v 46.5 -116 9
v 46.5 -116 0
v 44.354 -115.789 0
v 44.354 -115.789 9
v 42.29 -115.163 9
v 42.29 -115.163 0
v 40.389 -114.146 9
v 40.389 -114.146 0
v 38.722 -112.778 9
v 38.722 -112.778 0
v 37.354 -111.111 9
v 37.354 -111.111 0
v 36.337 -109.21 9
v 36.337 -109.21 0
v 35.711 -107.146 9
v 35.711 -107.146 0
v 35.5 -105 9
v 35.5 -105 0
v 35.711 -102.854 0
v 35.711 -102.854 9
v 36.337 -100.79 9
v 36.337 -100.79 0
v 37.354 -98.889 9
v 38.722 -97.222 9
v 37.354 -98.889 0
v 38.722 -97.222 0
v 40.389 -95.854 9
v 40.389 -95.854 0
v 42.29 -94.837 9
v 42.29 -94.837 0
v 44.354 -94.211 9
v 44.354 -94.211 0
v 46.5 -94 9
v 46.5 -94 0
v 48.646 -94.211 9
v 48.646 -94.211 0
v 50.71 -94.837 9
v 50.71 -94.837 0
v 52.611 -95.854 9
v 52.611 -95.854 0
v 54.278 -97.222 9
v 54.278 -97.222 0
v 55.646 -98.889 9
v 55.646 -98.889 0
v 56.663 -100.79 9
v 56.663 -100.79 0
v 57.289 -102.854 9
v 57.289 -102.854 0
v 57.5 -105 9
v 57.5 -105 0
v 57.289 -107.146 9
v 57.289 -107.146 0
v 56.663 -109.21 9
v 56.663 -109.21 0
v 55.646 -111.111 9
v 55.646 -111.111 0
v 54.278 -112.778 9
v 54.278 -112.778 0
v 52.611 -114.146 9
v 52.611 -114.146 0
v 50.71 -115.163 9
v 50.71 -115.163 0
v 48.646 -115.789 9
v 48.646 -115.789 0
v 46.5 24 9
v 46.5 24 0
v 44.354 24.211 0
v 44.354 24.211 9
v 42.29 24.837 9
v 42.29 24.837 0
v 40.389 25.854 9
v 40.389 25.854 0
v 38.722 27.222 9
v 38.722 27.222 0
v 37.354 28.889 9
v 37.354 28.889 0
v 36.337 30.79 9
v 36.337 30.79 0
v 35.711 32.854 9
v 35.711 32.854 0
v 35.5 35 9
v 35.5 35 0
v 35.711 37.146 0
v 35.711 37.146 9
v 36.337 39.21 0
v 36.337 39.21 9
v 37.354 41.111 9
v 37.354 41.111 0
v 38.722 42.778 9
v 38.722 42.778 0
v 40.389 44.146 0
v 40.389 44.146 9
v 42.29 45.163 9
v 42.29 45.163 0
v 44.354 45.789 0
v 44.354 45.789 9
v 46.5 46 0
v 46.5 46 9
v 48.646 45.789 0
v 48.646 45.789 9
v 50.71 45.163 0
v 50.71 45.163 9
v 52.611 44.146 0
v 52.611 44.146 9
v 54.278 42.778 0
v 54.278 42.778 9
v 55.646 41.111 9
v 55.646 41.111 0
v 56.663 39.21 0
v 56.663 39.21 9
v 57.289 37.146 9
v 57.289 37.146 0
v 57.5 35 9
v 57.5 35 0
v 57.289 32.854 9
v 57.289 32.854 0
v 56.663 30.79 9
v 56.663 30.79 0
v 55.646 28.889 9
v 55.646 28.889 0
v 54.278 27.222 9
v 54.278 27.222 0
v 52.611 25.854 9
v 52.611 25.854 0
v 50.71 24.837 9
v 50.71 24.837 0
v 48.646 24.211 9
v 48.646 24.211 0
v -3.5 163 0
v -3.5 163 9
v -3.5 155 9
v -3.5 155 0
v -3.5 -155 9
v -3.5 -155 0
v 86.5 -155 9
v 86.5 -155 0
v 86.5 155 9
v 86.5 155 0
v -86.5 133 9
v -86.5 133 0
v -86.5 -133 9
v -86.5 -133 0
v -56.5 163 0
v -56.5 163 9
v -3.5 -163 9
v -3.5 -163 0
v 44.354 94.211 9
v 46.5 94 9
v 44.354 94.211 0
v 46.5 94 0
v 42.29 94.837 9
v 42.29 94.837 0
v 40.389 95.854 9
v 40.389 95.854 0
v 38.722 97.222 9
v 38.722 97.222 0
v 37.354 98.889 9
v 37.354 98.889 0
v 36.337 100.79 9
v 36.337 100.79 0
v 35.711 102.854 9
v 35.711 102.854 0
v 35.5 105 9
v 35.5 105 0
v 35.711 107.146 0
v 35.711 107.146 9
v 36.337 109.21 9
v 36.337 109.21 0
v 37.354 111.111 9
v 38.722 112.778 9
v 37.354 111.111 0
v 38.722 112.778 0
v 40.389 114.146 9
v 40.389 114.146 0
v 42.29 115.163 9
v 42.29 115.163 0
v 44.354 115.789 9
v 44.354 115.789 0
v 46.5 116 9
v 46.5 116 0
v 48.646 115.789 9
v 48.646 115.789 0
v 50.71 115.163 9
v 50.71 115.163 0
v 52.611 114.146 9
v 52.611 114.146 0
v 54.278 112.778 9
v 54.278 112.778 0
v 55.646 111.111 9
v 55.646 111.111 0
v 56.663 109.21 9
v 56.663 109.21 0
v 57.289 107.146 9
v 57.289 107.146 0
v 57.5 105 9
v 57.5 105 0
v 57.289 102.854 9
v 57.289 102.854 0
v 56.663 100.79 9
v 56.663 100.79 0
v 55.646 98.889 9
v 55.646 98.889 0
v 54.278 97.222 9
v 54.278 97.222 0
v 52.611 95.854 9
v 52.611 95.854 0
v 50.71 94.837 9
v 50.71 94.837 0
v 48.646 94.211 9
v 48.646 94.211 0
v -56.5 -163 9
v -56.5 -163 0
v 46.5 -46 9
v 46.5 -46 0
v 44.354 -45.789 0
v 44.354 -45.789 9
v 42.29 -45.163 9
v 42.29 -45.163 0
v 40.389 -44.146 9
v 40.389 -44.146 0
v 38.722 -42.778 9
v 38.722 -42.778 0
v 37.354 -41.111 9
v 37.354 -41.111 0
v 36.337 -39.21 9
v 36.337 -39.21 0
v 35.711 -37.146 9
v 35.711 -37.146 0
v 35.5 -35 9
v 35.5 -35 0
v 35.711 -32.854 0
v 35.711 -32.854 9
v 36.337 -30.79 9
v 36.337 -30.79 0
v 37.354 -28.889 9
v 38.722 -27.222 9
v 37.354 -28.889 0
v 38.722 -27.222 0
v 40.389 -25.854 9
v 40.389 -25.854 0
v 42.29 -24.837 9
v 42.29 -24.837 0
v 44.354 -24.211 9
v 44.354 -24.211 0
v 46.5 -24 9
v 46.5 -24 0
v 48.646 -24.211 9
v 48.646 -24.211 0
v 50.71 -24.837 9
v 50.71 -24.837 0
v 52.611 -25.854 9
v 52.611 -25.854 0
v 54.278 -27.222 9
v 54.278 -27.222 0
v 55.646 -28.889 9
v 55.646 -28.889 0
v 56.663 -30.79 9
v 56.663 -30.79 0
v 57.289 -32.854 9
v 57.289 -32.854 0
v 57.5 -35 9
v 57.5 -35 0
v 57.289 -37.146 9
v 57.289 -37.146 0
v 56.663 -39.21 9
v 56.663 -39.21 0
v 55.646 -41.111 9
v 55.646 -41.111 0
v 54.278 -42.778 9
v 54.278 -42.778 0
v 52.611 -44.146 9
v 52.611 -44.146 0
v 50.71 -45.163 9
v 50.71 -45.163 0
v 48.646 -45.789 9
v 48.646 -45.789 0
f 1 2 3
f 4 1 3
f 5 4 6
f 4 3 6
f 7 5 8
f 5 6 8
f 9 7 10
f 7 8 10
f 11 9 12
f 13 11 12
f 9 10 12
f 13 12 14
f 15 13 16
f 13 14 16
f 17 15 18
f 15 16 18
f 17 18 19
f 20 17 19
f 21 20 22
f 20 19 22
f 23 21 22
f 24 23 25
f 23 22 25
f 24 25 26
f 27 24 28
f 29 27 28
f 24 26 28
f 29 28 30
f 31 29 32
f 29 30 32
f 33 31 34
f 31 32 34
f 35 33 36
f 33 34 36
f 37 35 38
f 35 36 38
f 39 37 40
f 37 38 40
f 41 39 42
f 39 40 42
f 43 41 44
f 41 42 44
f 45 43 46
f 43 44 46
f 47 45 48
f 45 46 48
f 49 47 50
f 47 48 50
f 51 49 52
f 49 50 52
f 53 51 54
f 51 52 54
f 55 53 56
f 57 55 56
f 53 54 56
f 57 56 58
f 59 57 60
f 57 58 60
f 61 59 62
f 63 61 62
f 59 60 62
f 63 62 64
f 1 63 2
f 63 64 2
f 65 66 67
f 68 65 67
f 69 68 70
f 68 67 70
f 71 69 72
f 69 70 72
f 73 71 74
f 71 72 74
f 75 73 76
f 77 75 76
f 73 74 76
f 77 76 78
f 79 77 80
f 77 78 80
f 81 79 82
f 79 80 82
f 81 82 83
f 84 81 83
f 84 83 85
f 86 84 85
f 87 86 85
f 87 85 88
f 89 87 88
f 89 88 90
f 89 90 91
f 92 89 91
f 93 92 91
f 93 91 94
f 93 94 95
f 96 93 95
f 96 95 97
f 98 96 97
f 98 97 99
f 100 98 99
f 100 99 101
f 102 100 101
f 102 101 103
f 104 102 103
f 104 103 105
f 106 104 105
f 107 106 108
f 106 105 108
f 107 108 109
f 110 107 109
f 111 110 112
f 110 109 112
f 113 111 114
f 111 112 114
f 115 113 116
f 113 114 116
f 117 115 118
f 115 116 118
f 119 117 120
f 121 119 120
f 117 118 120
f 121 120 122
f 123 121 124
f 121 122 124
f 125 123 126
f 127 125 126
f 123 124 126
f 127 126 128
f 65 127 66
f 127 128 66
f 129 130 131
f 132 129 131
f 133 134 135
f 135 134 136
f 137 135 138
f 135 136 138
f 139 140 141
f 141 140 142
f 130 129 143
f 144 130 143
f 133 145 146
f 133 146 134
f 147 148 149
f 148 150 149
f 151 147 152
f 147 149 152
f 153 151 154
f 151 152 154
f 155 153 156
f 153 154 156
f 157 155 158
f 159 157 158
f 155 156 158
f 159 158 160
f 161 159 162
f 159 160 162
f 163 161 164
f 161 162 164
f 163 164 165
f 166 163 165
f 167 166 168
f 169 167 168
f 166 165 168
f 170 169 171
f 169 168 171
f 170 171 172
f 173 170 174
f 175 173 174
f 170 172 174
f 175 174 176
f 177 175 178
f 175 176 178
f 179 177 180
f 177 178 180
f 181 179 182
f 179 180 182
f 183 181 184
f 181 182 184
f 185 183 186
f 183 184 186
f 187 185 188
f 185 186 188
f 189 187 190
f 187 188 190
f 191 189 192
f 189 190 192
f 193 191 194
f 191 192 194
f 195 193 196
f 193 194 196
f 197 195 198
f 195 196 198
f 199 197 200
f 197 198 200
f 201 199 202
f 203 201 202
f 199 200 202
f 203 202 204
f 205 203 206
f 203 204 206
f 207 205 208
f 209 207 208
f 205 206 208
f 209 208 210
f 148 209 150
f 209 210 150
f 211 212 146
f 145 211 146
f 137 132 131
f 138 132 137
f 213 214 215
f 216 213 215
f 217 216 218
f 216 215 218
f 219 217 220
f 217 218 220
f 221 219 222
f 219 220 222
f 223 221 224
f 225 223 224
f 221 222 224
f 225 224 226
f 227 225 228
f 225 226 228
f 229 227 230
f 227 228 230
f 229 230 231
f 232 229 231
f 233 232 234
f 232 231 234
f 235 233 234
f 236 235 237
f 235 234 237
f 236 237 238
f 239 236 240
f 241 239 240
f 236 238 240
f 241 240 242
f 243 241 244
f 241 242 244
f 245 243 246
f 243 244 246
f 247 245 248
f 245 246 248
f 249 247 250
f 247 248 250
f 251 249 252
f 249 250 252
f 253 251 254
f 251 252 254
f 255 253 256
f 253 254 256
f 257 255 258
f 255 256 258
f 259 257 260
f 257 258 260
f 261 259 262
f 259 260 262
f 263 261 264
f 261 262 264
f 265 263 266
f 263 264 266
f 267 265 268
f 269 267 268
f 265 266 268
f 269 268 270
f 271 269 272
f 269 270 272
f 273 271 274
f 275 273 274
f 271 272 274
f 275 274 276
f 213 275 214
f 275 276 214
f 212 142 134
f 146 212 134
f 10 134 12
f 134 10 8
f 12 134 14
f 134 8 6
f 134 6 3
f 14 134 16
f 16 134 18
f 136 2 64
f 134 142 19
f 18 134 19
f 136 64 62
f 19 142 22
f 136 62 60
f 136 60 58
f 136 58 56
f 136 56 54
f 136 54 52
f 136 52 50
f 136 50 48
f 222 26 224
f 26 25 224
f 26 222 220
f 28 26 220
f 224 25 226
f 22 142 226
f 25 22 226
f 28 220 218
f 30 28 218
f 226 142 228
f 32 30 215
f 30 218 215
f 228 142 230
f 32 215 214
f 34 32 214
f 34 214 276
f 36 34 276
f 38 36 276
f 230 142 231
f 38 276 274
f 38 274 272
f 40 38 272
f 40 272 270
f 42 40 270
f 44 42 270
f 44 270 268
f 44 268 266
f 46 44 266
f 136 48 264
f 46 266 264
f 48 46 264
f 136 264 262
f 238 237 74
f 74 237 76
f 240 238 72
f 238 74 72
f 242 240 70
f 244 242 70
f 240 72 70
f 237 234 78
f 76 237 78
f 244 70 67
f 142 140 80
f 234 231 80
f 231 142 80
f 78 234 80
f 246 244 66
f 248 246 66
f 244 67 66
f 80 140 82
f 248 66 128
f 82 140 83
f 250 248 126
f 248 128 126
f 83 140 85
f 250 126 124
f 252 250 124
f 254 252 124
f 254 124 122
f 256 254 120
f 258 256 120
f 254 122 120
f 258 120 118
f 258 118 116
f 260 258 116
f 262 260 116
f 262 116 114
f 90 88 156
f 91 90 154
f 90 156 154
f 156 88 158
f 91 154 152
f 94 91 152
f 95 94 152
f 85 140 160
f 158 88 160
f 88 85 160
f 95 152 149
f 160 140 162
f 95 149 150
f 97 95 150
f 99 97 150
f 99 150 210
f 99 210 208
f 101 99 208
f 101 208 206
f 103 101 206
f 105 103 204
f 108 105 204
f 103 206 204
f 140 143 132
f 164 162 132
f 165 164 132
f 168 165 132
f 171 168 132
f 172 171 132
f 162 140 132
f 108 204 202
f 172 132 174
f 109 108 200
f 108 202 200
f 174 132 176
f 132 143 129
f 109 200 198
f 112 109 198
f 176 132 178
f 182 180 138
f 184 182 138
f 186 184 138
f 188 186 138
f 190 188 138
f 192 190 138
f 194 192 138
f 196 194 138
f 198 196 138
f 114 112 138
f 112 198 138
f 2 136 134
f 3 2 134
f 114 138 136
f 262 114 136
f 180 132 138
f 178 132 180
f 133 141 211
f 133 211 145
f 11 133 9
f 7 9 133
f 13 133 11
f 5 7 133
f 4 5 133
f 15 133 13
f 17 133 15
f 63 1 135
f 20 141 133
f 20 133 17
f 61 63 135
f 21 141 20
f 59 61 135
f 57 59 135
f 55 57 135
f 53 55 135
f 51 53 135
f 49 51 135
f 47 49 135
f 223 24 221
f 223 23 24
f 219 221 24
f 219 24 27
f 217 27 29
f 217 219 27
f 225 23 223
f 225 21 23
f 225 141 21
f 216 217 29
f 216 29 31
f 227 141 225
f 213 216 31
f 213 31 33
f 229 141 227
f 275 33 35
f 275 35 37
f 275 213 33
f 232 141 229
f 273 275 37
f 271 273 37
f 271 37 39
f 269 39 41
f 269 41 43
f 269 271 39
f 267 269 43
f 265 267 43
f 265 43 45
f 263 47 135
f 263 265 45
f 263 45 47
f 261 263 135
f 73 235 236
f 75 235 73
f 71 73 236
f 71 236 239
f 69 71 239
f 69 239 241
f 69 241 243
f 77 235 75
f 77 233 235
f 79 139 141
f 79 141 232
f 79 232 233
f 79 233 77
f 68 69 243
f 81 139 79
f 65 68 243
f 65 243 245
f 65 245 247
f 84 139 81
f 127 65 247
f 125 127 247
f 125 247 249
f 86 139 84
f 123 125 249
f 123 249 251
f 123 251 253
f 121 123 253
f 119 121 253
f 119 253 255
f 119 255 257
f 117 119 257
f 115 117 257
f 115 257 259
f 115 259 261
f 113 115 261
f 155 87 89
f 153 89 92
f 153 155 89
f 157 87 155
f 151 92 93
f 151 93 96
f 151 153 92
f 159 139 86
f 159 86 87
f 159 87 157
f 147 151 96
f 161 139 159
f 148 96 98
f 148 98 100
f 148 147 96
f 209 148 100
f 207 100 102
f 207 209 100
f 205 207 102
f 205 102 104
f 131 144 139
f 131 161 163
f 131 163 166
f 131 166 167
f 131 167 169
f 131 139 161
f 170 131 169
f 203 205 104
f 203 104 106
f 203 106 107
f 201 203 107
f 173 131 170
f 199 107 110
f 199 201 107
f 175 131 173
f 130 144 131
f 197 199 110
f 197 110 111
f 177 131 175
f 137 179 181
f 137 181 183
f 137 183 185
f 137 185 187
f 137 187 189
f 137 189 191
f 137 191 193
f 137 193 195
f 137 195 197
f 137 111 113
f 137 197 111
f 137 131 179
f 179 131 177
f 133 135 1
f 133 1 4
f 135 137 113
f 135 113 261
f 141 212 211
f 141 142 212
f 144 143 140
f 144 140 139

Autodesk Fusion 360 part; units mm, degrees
sketch "スケッチ1" plane through (0, 0, 0) normal (0, 0, 1) x (1, 0, 0)
  line L0 (-3.5, 163) -> (-86.5, 163)
  line L1 (-86.5, 163) -> (-86.5, -163)
  line L2 (-86.5, -163) -> (-3.5, -163)
  line L3 (86.5, -155) -> (86.5, 155)
  line L4 (82.2546, 155) -> (-86.5, -163) construction
  line L5 (-86.5, 163) -> (82.2546, -155) construction
  line L6 (-3.5, 163) -> (-3.5, 155)
  line L7 (-3.5, 155) -> (86.5, 155)
  line L8 (-3.5, -163) -> (-3.5, -155)
  line L9 (-3.5, -155) -> (86.5, -155)
  dimension "d2" = 326
extrude "押し出し1" add sketch "スケッチ1" along normal blind 9
chamfer "面取り1" distance 30 angle 45 2 edges at (-86.5, -163, 4.5) (-86.5, 163, 4.5)
sketch "スケッチ2" plane through (0, 0, 9) normal (0, 0, 1) x (-1, 0, 0)
  line L0 (56.5, -163) -> (86.5, -133)
  line L1 (86.5, -133) -> (86.5, 133)
  line L2 (86.5, 133) -> (56.5, 163)
  line L3 (56.5, 163) -> (3.5, 163)
  line L4 (3.5, 163) -> (3.5, 155)
  line L5 (3.5, 155) -> (-86.5, 155)
  line L6 (-86.5, 155) -> (-86.5, -155)
  line L7 (-86.5, -155) -> (3.5, -155)
  line L8 (3.5, -155) -> (3.5, -163)
  line L9 (3.5, -163) -> (56.5, -163)
  line L10 (-86.5, -155) -> (-46.5, -155) construction
  line L11 (-46.5, -155) -> (-46.5, -105) construction
  line L12 (-46.5, -105) -> (-86.5, -105) construction
  line L13 (-86.5, -105) -> (-86.5, -155) construction
  line L14 (-46.5, -105) -> (-46.5, -35) construction
  line L15 (-86.5, 0) -> (101.7247, 0)
  point P0 (-46.5, -105)
  point P1 (-46.5, -35)
  point P2 (-46.5, 105)
  point P3 (-46.5, 35)
  dimension "d10" = 40
  dimension "d11" = 50
  dimension "d12" = 70
hole "穴1" at (46.5, 105, 9) at (46.5, 35, 9) at (46.5, -35, 9) at (46.5, -105, 9) direction (0, 0, -1) diameter 22 end through all
